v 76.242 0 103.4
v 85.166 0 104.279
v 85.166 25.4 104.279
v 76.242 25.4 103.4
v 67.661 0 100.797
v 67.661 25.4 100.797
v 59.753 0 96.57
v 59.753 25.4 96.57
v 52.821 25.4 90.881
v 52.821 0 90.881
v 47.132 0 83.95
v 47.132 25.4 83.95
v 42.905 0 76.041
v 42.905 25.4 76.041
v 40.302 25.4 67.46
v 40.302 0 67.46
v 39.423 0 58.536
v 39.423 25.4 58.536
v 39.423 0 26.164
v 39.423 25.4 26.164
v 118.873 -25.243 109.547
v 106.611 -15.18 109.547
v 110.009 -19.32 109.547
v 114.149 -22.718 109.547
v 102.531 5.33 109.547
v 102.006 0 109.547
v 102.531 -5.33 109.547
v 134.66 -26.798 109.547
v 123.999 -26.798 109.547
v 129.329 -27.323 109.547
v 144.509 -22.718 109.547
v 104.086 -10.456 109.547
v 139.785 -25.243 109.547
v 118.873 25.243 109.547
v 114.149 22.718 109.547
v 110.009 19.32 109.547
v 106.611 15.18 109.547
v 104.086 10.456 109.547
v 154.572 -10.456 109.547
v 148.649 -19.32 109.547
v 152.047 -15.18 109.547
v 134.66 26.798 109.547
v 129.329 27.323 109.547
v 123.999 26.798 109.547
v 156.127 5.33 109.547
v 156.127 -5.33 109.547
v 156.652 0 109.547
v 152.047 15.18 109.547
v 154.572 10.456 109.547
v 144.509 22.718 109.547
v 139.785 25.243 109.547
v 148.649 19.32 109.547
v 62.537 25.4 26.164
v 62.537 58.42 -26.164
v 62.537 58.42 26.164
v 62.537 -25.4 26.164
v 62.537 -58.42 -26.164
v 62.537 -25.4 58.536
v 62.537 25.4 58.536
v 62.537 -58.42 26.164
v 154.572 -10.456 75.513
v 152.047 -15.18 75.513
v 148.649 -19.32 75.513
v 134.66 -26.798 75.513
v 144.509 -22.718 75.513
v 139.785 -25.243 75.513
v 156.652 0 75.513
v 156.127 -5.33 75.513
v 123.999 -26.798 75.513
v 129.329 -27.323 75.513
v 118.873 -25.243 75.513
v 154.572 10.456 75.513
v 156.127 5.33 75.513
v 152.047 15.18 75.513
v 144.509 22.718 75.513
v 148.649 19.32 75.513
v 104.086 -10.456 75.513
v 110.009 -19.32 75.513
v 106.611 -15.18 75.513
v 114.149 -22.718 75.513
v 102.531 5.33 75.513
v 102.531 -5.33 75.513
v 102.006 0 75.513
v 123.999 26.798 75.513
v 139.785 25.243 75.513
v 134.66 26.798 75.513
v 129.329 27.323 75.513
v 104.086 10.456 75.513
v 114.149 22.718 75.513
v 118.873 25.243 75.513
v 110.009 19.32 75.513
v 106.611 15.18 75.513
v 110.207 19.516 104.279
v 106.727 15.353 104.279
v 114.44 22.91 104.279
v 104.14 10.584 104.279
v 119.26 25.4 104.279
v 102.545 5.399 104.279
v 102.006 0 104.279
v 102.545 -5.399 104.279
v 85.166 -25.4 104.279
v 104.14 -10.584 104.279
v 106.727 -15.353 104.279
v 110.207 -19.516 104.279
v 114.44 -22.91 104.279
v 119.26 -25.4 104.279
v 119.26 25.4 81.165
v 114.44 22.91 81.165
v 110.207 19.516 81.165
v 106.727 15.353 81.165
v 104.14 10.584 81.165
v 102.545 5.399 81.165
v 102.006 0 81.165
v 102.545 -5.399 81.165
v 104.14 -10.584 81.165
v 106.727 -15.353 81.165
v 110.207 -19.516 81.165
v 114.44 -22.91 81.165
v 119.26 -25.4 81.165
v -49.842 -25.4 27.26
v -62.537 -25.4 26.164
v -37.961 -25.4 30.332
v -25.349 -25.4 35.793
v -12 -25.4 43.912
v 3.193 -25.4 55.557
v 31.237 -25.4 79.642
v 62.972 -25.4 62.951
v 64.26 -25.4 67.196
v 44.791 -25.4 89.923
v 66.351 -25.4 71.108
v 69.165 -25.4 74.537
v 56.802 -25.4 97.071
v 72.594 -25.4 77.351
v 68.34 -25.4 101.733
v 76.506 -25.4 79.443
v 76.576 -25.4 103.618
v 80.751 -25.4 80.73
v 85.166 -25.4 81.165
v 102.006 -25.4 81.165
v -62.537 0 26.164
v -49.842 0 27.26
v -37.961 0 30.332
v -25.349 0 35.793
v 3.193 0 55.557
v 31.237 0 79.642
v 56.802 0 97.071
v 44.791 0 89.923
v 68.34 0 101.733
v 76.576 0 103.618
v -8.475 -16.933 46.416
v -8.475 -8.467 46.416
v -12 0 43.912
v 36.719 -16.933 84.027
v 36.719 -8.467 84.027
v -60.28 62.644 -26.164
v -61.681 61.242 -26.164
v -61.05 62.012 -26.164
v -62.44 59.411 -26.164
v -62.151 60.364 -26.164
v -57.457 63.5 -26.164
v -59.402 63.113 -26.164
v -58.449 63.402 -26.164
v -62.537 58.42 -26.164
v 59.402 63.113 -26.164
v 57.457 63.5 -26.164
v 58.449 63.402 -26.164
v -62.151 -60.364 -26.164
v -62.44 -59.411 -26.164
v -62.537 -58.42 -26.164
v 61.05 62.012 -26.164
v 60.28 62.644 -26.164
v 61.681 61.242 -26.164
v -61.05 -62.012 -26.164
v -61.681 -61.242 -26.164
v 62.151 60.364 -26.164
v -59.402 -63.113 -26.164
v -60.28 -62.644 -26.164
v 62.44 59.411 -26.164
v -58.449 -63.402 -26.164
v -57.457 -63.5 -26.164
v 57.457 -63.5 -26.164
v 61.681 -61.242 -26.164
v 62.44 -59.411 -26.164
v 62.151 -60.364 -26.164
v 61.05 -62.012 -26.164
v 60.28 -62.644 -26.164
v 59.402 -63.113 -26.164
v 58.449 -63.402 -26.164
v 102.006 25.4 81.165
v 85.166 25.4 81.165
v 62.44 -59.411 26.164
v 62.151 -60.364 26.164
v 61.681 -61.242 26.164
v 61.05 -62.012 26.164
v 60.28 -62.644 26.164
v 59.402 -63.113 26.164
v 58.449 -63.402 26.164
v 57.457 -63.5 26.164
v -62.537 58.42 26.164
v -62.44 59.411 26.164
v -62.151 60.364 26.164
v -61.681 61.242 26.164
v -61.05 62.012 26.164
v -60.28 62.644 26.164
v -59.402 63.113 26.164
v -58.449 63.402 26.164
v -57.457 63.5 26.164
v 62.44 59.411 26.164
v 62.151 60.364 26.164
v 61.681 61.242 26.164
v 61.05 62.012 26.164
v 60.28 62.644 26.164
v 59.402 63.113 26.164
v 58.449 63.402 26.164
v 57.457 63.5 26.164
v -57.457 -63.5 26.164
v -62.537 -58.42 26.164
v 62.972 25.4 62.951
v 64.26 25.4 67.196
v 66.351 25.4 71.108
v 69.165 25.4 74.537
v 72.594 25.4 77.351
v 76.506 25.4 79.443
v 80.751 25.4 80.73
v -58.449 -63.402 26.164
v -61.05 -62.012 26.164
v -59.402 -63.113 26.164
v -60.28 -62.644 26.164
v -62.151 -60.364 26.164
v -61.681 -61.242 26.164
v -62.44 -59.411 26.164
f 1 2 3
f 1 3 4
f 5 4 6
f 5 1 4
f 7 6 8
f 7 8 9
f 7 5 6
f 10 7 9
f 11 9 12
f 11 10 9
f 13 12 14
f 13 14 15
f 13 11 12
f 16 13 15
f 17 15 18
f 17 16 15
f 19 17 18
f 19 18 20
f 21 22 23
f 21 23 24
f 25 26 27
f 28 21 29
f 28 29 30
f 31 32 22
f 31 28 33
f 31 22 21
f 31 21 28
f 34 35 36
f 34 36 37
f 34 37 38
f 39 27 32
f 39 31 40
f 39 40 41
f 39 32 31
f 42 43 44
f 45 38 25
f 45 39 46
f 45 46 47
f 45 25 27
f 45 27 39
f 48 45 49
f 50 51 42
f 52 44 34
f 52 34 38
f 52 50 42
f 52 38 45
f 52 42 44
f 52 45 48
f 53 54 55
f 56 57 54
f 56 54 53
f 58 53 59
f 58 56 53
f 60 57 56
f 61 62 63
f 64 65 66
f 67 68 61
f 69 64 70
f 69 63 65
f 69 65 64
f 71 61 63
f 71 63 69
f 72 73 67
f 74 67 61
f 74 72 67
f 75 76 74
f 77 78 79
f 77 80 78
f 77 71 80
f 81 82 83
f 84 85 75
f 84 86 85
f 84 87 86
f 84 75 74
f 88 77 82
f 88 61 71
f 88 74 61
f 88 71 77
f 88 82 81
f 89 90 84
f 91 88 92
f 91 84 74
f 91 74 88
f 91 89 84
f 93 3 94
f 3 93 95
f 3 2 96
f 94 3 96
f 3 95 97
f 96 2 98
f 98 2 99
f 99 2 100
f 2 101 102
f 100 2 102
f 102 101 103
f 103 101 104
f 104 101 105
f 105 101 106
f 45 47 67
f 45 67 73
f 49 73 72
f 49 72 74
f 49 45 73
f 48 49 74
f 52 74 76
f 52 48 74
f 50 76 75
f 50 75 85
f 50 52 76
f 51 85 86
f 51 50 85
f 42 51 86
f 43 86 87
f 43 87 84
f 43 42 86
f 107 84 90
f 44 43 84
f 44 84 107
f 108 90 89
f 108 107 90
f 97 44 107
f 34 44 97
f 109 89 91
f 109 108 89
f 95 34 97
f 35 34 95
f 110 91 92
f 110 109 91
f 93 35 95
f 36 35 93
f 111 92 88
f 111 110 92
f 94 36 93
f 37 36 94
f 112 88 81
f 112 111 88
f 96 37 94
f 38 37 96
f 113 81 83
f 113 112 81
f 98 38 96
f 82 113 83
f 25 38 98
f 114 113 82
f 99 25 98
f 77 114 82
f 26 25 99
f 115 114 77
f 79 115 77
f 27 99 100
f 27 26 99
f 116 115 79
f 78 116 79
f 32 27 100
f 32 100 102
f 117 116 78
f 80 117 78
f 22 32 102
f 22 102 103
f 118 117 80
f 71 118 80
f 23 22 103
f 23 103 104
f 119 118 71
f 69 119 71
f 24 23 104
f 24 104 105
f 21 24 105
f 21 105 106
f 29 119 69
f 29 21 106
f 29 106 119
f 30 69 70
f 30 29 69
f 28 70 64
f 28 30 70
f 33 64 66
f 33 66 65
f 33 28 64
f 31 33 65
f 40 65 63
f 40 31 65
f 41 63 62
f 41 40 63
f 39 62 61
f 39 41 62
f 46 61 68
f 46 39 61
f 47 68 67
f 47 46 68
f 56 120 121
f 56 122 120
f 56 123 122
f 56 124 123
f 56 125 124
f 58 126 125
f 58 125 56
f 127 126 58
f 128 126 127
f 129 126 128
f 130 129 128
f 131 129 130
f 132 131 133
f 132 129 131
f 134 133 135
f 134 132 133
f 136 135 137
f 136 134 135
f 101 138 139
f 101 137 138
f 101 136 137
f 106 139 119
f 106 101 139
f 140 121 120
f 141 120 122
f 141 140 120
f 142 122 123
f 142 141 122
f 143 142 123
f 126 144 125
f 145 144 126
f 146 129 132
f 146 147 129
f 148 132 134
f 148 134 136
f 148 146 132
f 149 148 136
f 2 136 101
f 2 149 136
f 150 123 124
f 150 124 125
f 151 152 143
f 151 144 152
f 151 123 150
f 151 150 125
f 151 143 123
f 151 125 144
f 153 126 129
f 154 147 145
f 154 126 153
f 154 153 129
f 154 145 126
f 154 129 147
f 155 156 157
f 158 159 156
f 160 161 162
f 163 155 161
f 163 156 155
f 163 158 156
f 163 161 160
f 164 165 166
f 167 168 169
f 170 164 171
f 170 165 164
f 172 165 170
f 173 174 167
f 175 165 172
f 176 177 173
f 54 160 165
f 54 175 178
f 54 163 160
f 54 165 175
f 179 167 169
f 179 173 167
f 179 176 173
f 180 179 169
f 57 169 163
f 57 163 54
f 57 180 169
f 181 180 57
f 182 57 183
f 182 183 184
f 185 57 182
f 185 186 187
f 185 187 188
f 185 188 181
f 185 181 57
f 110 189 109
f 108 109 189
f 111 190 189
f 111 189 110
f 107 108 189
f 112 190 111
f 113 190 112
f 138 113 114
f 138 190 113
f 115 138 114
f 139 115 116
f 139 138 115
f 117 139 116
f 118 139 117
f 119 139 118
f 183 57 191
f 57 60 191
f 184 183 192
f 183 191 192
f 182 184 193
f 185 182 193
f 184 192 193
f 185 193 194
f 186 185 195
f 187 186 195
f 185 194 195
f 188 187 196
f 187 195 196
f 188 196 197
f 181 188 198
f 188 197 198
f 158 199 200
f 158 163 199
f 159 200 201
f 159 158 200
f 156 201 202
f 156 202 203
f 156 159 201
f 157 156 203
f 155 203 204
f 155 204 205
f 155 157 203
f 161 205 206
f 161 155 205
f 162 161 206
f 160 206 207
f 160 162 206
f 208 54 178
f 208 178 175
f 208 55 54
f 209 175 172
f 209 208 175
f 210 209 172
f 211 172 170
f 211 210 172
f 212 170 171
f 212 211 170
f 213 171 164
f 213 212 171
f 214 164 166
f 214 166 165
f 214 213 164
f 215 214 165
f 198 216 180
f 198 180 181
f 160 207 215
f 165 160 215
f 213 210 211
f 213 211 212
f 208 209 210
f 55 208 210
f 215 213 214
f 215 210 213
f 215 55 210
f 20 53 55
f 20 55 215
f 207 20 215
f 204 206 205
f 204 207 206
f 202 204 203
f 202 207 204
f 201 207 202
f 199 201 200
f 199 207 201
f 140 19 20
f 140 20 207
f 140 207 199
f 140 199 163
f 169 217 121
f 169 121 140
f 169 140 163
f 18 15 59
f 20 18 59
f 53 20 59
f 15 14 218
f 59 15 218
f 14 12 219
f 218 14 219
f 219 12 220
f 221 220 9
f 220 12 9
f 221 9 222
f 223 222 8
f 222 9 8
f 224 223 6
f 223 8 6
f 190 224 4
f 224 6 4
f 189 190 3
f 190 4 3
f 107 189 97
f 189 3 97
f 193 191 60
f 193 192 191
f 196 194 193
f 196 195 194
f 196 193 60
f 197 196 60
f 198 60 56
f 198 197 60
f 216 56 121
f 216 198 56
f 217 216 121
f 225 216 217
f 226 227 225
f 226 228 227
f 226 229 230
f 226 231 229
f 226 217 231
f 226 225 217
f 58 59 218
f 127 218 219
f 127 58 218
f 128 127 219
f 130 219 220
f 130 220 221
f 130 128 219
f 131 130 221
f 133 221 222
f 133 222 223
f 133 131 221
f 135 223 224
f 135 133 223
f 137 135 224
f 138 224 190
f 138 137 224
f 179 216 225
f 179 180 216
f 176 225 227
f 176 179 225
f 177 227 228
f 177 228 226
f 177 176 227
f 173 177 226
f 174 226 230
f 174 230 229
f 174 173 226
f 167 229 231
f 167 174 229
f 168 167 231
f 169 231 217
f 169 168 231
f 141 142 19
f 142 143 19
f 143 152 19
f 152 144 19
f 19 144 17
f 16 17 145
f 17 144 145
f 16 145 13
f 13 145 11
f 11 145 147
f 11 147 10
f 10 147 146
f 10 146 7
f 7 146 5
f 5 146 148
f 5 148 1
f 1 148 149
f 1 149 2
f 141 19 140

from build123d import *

# Parameters (mm, degrees)
F1_DEPTH = 63.5
F2_DEPTH = 25.4
F3_DEPTH = 25.4
F0_W     = 27.3230625695
F0_H     = 23.1139993296
F4_DEPTH = 25.4
F6_R     = 5.08
F7_R     = 5.08
F8_R     = 5.08


with BuildPart() as f1:
    # F0 (on Front) → F1 (new body, symmetric)
    with BuildSketch(Plane.XZ):
        Polygon((62.5374689698, -26.1636357754), (62.5374689698, 26.1636357754), (39.4234696403, 26.1636357754), (-62.5374689698, 26.1636357754), (-62.5374689698, -26.1636357754), align=None)
    extrude(amount=F1_DEPTH, both=True)

    # F0 (on Front) → F2 (join, symmetric)
    with BuildSketch(Plane.XZ):
        with BuildLine():
            Line((39.4234696403, 26.1636357754), (62.5374689698, 26.1636357754))
            Line((62.5374689698, 26.1636357754), (62.5374689698, 58.5364728849))
            ThreePointArc((62.5374689698, 58.5364728849), (69.1652190391, 74.5372769902), (85.1660231445, 81.1650270596))
            Line((85.1660231445, 81.1650270596), (102.0061121875, 81.1650270596))
            Line((102.0061121875, 81.1650270596), (102.0061121875, 104.2790263891))
            Line((102.0061121875, 104.2790263891), (85.1660231445, 104.2790263891))
            ThreePointArc((85.1660231445, 104.2790263891), (52.8211533729, 90.8813426565), (39.4234696403, 58.5364728849))
            Line((39.4234696403, 58.5364728849), (39.4234696403, 26.1636357754))
        make_face()
    extrude(amount=F2_DEPTH, both=True)

    # F0 (on Front) → F3 (join)
    with BuildSketch(Plane.XZ):
        with BuildLine():
            Line((-62.5374689698, 26.1636357754), (39.4234696403, 26.1636357754))
            Line((39.4234696403, 26.1636357754), (39.4234696403, 58.5364728849))
            ThreePointArc((39.4234696403, 58.5364728849), (52.8211533729, 90.8813426565), (85.1660231445, 104.2790263891))
            add(Edge.make_bspline(
                [(-62.5374689698, 26.1636357754), (0, 26.1636357754), (31.0528287573, 104.2790263891), (85.1660231445, 104.2790263891)],
                knots=[0, 0, 0, 0, 167.0878087519, 167.0878087519, 167.0878087519, 167.0878087519], degree=3))
        make_face()
    extrude(amount=F3_DEPTH)

    # F0 (on Front) → F4 (join, symmetric)
    with BuildSketch(Plane.XZ):
        with Locations((115.6676434722, 92.7220267243)):
            Rectangle(F0_W, F0_H)
    extrude(amount=F4_DEPTH, both=True)

    # F0 (on Front) → F5 (revolve)
    with BuildSketch(Plane.XZ):
        Polygon((129.329174757, 104.2790263891), (129.329174757, 81.1650270596), (129.329174757, 75.5129270256), (156.6522373265, 75.5129270256), (156.6522373265, 109.546918422), (129.329174757, 109.546918422), align=None)
    revolve(axis=Axis((129.329174757, 0, 92.5299227238), (0, 0, 1)))

    # F6
    f6_edges = [f1.edges().sort_by_distance(p)[0] for p in [
        (62.537469, -63.5, 0),
    ]]
    fillet(f6_edges, radius=F6_R)

    # F7
    f7_edges = [f1.edges().sort_by_distance(p)[0] for p in [
        (-62.537469, -63.5, 0),
    ]]
    fillet(f7_edges, radius=F7_R)

    # F8
    f8_edges = [f1.edges().sort_by_distance(p)[0] for p in [
        (-62.537469, 63.5, 0),
        (62.537469, 63.5, 0),
    ]]
    fillet(f8_edges, radius=F8_R)


solid = f1.part
